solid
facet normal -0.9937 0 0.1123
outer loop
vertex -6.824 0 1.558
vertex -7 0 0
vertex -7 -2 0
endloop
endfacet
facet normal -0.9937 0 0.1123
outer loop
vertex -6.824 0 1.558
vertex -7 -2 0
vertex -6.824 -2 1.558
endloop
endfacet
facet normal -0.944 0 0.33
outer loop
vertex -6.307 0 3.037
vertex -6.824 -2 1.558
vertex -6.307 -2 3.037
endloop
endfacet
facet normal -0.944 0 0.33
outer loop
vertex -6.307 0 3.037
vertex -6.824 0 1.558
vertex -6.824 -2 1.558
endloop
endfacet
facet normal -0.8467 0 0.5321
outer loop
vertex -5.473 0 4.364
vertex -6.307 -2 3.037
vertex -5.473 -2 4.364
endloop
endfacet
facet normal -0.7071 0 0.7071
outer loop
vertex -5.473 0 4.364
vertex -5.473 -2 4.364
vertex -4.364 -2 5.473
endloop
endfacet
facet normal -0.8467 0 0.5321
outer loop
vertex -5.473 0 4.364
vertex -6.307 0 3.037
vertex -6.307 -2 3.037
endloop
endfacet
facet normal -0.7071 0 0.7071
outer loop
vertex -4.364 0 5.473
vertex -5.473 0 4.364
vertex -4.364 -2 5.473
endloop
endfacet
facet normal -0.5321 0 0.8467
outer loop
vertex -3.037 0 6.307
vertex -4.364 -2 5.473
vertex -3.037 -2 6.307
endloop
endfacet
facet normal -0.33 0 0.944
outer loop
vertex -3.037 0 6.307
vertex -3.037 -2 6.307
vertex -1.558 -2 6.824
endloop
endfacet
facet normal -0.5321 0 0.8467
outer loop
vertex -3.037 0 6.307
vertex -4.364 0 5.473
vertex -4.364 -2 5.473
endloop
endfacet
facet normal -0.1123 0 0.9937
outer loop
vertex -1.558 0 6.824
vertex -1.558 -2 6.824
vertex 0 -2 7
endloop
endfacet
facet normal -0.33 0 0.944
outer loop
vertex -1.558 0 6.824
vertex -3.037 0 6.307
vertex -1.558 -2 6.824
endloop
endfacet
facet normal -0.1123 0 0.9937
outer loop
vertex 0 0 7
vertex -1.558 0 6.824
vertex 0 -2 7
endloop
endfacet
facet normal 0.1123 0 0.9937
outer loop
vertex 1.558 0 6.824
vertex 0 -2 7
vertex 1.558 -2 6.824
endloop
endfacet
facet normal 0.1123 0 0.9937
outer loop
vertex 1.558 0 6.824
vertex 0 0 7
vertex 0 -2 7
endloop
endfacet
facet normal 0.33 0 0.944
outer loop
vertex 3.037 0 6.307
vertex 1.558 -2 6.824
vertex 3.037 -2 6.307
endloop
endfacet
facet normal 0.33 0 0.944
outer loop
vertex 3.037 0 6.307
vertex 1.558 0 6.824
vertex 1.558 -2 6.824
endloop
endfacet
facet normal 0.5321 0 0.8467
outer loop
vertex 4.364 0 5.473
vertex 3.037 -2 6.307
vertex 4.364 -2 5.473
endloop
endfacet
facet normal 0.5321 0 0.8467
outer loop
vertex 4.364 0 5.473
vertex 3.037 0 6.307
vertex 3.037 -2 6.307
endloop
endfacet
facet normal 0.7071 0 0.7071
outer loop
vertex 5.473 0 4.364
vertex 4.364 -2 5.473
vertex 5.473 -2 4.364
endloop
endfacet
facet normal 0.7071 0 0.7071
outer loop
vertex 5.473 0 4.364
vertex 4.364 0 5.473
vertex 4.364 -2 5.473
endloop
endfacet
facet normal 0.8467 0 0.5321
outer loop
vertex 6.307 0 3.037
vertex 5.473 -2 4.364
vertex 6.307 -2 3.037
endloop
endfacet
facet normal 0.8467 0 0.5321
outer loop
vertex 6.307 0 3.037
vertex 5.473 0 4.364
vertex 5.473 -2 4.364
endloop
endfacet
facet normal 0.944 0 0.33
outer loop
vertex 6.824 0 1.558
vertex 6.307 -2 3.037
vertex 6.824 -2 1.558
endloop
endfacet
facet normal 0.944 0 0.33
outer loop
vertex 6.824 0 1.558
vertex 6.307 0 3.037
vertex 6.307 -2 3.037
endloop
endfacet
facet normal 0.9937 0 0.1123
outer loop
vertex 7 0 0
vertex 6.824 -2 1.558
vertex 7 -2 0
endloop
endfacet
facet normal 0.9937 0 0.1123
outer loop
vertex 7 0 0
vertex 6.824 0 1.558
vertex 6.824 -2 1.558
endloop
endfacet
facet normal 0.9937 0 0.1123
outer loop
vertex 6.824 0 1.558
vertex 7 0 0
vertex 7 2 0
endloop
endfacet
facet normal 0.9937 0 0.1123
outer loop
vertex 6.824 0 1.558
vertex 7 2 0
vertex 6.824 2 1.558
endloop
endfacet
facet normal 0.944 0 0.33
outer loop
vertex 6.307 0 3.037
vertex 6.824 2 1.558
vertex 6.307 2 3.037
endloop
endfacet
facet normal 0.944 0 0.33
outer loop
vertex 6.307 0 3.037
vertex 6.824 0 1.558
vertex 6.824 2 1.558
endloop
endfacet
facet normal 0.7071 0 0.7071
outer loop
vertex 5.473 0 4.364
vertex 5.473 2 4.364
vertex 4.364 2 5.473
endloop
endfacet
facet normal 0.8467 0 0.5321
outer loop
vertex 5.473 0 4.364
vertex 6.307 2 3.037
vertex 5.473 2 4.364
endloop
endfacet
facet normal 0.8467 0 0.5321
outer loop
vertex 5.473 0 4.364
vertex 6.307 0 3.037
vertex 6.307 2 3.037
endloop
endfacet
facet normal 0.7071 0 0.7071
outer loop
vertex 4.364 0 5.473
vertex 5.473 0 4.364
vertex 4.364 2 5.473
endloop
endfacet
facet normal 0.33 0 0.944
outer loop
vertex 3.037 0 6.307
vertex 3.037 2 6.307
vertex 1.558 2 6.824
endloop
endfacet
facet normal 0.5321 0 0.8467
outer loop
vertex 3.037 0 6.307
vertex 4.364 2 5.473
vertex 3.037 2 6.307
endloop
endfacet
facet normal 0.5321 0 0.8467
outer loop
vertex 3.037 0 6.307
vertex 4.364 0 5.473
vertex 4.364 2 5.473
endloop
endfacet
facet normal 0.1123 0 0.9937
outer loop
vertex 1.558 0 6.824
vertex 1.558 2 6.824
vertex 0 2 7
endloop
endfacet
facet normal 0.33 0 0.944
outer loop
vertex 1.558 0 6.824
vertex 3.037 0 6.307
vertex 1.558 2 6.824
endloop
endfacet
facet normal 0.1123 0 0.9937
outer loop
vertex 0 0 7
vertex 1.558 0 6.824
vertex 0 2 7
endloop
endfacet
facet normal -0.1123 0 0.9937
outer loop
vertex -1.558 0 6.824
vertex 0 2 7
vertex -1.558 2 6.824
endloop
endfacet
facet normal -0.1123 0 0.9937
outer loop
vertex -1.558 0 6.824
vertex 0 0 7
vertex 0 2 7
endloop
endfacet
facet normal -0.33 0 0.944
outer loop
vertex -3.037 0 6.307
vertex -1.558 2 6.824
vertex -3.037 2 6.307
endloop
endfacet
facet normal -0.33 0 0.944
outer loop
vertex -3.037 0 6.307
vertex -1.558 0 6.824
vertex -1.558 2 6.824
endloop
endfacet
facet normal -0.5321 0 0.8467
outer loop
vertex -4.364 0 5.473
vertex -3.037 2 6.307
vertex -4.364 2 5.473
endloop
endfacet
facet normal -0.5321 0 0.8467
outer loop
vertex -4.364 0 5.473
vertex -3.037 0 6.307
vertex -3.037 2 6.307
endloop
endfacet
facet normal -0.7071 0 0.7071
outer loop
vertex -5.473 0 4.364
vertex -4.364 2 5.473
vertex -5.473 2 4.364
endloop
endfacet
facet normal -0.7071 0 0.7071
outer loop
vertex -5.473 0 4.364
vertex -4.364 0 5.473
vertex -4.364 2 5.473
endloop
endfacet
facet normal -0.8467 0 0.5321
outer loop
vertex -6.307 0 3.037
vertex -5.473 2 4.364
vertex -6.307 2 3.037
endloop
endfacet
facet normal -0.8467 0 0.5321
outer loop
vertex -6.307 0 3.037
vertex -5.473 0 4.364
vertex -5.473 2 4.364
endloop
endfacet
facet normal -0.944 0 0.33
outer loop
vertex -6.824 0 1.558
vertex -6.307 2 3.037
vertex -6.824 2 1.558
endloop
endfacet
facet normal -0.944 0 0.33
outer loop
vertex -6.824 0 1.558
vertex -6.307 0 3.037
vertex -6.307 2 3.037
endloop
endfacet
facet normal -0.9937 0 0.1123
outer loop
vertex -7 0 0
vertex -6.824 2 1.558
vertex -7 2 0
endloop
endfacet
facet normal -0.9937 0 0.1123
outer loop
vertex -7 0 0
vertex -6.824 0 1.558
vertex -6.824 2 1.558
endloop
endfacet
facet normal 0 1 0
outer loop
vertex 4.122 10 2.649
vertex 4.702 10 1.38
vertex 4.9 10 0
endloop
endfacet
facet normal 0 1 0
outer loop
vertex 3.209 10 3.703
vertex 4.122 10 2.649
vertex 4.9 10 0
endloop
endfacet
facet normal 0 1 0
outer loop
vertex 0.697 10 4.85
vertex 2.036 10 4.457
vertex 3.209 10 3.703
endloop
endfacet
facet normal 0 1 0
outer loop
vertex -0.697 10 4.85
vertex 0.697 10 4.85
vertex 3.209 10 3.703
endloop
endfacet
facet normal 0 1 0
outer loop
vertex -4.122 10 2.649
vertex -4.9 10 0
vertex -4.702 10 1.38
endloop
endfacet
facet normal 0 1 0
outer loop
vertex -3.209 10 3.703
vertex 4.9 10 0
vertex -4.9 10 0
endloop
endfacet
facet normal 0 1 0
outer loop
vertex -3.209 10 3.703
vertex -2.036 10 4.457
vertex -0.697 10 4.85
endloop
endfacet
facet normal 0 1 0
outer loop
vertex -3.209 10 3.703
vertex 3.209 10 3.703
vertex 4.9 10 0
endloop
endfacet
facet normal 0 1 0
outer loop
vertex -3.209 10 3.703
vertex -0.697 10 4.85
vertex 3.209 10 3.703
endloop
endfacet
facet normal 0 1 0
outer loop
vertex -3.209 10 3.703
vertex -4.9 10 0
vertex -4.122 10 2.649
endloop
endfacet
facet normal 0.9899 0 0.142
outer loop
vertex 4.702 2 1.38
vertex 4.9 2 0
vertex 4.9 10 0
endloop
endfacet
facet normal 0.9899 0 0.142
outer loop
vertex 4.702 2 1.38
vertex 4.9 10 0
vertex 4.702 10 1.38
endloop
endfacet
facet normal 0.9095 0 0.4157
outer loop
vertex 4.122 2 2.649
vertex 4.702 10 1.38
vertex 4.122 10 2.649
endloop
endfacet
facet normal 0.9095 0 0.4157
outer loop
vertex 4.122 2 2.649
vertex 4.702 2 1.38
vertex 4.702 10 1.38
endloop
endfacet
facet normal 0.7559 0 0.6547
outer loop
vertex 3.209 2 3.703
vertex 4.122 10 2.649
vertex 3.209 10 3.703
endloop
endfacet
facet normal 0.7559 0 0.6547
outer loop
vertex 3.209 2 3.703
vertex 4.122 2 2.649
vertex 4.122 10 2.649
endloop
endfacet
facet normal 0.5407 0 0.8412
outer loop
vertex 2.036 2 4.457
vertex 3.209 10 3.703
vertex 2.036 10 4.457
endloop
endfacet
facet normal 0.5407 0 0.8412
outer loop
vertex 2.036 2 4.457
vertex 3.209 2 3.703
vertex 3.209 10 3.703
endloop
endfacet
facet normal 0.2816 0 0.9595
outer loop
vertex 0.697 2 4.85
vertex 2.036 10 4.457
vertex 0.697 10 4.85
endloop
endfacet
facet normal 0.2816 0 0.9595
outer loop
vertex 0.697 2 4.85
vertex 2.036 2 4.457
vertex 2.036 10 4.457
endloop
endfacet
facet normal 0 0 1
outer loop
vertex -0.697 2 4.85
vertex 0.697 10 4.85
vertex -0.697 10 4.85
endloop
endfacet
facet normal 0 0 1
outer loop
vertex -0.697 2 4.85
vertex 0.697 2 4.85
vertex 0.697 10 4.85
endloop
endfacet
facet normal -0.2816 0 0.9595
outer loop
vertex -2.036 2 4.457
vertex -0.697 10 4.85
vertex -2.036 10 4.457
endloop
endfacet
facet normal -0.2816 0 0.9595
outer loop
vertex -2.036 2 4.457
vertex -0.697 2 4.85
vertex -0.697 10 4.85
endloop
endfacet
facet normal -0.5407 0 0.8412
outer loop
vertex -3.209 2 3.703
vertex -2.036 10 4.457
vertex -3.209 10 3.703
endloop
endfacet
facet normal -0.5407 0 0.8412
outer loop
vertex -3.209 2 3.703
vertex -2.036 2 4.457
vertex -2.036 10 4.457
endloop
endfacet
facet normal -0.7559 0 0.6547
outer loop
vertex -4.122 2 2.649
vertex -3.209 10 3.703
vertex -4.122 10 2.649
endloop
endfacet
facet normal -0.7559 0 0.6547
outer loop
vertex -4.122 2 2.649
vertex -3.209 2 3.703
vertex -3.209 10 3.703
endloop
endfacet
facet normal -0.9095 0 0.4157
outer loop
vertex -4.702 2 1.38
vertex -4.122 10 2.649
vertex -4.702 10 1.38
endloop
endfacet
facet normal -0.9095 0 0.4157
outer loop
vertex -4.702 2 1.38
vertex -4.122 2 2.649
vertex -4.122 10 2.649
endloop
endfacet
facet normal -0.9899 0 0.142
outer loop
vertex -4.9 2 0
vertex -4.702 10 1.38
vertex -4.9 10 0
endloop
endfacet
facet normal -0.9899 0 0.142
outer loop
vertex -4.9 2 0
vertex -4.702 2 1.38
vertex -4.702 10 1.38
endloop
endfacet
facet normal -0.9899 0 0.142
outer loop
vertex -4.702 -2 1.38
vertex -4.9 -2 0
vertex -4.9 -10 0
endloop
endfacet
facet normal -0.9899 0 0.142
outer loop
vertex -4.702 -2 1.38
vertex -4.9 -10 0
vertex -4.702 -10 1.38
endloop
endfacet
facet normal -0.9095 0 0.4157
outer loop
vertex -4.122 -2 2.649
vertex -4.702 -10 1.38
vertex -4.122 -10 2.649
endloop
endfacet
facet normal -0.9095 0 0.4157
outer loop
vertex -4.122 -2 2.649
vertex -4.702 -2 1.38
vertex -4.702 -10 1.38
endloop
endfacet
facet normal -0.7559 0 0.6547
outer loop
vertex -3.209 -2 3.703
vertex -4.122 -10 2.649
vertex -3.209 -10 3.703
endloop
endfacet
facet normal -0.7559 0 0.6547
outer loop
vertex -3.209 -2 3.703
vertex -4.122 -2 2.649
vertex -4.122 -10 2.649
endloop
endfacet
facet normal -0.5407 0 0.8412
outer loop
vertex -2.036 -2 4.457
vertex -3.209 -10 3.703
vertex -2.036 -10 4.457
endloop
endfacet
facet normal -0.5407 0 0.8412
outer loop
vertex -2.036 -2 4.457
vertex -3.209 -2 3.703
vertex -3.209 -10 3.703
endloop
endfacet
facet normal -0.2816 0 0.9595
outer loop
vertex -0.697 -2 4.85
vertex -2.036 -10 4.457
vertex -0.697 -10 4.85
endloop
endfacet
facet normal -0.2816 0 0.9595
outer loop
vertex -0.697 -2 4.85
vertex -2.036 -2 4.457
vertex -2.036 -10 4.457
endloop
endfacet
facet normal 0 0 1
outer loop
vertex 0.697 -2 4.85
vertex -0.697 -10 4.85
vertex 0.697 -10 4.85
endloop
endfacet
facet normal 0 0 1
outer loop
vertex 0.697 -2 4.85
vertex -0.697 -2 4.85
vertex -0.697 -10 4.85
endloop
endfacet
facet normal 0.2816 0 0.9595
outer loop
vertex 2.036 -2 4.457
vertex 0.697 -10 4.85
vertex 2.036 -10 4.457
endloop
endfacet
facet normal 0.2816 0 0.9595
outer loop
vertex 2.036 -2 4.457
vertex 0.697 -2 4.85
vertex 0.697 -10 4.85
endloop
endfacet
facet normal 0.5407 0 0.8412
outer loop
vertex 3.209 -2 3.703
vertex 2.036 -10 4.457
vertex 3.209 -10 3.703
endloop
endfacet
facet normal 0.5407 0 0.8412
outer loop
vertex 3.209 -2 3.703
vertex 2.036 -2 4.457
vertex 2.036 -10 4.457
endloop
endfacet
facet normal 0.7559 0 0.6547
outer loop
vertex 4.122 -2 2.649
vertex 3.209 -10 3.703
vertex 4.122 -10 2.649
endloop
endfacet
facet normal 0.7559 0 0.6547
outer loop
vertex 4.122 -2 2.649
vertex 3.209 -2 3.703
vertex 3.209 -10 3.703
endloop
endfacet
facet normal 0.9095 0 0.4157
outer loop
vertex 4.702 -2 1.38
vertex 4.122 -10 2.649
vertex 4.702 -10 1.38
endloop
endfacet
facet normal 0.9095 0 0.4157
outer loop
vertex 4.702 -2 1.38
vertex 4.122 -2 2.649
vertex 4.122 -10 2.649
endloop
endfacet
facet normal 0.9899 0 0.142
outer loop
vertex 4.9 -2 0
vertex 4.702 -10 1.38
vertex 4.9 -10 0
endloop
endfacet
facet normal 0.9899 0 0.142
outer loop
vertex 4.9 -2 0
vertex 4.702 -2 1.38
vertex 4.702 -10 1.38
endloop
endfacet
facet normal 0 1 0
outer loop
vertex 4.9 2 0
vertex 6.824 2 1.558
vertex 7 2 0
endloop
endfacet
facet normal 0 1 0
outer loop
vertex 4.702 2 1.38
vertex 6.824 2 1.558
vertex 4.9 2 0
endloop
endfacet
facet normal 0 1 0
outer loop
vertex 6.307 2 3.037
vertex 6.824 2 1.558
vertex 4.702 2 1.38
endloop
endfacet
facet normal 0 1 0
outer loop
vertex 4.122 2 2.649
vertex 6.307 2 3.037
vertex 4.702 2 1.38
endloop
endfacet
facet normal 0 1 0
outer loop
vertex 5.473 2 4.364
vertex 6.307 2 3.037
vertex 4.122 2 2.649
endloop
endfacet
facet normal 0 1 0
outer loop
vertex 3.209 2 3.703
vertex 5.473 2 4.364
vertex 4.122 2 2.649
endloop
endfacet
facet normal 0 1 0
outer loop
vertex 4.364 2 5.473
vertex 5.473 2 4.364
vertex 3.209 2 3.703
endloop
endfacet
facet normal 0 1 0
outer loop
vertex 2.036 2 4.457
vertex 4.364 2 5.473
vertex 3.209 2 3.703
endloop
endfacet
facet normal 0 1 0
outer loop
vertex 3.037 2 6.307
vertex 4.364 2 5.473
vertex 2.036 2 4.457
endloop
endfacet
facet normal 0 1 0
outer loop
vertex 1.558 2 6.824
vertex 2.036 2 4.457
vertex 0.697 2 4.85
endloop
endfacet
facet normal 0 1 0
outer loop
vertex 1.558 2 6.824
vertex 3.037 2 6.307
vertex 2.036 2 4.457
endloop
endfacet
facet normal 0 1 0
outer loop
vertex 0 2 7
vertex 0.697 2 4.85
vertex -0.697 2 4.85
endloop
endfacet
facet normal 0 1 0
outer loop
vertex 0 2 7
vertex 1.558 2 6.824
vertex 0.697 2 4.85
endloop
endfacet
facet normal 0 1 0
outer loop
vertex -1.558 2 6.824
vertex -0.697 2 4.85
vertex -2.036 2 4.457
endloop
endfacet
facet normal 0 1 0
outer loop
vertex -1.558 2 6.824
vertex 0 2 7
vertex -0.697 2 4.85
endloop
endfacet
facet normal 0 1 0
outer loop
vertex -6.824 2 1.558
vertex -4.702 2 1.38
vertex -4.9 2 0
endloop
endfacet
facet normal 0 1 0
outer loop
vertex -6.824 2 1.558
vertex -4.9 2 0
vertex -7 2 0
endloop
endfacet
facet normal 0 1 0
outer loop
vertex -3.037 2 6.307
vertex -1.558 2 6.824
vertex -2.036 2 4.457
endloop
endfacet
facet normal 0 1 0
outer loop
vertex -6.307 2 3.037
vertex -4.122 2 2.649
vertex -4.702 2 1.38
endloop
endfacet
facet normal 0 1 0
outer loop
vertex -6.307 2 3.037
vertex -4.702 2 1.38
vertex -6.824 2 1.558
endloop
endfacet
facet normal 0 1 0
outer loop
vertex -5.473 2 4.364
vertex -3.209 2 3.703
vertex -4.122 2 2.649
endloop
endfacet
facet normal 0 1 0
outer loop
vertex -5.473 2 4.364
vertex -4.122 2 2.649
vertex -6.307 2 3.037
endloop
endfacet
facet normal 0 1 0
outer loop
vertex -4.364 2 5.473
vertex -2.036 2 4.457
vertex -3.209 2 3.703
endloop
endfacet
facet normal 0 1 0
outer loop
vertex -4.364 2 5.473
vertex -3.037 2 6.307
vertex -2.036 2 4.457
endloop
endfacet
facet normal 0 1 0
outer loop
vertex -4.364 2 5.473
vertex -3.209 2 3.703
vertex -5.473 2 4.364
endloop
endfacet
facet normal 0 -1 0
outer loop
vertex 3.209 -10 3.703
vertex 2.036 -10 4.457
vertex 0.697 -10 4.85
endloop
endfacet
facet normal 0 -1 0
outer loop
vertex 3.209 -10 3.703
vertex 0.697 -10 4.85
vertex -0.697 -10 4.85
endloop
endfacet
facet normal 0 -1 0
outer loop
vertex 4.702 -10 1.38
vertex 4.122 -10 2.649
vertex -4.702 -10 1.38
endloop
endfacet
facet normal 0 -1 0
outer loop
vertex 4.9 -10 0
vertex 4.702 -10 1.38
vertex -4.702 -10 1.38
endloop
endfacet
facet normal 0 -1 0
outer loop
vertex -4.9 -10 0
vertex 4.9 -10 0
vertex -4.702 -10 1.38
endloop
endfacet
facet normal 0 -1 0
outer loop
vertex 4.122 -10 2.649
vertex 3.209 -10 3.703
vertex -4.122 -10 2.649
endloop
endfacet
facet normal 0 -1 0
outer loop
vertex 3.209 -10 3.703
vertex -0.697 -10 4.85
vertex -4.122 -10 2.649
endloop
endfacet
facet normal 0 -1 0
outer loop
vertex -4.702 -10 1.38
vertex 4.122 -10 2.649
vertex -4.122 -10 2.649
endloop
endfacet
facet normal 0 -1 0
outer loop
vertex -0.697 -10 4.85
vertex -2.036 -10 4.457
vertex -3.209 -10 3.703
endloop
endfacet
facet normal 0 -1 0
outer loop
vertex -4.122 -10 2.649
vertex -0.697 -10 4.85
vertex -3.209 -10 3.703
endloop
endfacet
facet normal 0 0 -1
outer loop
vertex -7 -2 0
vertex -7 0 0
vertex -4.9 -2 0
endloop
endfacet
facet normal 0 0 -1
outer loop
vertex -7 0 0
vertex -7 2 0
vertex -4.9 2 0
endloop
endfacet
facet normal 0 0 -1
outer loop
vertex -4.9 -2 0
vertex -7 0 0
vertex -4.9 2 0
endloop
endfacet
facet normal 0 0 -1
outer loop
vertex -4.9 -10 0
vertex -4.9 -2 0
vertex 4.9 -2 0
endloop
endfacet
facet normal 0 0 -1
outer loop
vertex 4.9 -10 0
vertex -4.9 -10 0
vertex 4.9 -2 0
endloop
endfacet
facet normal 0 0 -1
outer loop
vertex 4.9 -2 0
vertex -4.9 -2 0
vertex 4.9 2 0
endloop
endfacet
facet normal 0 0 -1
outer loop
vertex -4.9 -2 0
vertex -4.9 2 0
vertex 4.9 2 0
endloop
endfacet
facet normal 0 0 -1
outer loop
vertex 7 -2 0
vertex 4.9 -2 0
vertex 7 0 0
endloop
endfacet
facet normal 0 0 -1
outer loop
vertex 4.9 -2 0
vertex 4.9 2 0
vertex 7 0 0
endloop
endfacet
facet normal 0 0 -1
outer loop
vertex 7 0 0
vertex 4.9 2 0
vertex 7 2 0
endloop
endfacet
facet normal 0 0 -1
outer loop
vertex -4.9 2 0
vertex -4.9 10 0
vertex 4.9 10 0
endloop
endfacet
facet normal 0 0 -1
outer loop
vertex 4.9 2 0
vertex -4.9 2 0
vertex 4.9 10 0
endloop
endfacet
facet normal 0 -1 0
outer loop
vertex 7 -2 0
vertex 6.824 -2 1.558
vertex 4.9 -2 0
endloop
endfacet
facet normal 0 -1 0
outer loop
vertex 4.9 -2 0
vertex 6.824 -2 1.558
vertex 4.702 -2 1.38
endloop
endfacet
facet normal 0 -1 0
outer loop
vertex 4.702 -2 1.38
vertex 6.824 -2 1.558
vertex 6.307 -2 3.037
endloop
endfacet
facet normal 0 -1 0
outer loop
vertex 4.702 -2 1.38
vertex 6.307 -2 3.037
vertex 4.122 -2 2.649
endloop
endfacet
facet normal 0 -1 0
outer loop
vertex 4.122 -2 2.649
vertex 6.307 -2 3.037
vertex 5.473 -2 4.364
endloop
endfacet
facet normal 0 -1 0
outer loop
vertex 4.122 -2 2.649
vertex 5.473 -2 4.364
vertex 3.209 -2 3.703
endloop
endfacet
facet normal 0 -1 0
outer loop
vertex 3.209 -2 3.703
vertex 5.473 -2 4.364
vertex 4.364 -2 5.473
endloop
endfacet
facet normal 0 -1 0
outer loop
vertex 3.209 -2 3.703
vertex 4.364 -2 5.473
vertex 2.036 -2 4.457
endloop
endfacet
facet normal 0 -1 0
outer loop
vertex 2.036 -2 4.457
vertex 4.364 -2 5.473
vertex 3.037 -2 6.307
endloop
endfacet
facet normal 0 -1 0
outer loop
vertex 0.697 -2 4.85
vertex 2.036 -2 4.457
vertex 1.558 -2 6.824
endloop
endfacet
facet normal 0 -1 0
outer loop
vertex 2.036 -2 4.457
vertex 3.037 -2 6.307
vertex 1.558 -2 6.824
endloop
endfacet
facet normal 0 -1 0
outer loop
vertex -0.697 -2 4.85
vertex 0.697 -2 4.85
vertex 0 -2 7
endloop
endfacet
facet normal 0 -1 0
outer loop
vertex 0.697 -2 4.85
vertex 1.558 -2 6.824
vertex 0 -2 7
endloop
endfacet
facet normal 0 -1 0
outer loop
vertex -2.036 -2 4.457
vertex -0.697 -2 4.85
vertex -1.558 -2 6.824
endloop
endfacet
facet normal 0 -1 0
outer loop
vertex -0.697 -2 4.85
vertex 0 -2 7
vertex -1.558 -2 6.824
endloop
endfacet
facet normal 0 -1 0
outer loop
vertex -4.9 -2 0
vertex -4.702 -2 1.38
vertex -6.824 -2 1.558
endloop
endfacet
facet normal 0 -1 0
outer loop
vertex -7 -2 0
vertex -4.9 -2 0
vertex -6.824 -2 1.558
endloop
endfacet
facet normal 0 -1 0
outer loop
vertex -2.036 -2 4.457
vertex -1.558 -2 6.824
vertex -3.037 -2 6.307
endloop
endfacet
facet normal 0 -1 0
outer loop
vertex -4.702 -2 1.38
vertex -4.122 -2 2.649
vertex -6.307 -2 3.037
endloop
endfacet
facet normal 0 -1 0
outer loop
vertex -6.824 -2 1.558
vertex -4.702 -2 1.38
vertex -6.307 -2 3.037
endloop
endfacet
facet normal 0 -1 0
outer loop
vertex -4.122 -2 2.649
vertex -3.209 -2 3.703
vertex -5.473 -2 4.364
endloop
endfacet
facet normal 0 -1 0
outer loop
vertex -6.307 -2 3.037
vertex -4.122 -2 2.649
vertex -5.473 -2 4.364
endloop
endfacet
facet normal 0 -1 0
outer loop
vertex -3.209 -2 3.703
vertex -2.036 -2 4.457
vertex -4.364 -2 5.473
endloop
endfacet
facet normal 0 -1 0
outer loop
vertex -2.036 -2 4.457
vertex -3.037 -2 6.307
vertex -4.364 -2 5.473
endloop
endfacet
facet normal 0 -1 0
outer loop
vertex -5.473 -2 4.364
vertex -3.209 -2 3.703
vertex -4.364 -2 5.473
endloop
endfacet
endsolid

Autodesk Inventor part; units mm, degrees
ref_plane "YZ Plane" through (0, 0, 0) normal (1, 0, 0) x (0, 1, 0)
ref_plane "XZ Plane" through (0, 0, 0) normal (0, 1, 0) x (-1, 0, 0)
ref_plane "XY Plane" through (0, 0, 0) normal (0, 0, 1) x (1, 0, 0)
sketch "Sketch1" plane through (0, 0, 0) normal (0, 1, 0) x (-1, 0, 0)
  circle A0 centre (0, 0) radius 4.9
  dimension "d0" = 9.8
extrude "Extrusion1" add sketch "Sketch1" along normal mid plane 20
sketch "Sketch2" plane through (0, 0, 0) normal (0, 1, 0) x (-1, 0, 0)
  circle A0 centre (0, 0) radius 7
  dimension "d3" = 14
extrude "Extrusion2" add sketch "Sketch2" along normal mid plane 4
sketch "Sketch3" plane through (0, 10, 0) normal (0, 1, 0) x (1, 0, 0)
  line L0 (-12, 0) -> (13, 0)
  line L1 (13, 0) -> (13, 11)
  line L2 (13, 11) -> (-12, 11)
  line L3 (-12, 11) -> (-12, 0)
  point P0 (0, 0)
extrude "Extrusion3" cut sketch "Sketch3" against normal blind 28
properties part number "wall_pin"
